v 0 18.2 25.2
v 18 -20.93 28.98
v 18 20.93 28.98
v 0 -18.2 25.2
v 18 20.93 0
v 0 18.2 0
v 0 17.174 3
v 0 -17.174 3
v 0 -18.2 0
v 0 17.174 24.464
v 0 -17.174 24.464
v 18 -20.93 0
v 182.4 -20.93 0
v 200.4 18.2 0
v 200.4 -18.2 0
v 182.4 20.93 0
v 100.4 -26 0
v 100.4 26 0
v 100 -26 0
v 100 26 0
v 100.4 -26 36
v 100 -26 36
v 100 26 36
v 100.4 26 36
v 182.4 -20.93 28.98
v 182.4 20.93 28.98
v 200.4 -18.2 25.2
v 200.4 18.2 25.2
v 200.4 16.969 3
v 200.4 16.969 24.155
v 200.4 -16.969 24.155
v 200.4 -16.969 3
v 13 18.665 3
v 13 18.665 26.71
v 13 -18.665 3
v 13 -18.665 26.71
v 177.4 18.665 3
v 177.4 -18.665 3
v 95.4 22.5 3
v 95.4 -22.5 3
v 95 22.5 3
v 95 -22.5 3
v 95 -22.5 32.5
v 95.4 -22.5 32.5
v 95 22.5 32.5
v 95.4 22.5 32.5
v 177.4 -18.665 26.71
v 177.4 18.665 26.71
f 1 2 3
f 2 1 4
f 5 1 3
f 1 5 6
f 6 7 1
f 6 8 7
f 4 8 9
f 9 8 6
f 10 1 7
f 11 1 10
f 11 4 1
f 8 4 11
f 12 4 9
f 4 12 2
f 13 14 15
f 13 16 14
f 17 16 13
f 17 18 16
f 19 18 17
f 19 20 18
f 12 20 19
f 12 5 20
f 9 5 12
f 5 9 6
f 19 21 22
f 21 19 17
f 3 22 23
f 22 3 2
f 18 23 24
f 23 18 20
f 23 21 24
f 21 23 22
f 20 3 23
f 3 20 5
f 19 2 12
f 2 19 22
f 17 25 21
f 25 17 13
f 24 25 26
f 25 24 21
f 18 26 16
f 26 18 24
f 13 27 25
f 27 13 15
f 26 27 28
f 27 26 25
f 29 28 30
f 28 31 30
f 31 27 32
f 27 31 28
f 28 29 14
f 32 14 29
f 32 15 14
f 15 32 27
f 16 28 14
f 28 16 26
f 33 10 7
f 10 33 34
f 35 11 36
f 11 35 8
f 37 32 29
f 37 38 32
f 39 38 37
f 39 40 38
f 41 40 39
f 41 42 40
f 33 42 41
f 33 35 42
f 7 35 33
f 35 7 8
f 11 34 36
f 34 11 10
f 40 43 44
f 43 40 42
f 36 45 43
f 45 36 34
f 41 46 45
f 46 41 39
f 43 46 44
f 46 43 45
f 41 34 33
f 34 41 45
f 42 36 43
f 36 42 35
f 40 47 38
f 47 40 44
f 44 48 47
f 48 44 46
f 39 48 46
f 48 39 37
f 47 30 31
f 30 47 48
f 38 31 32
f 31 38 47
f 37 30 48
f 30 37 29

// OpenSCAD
$fn = 32;

// ----------------------------------------------------------------------
// Faired channel: 200 x 52 x 36 mm, 3.5 mm walls, faired ends
// ----------------------------------------------------------------------

// --- parameters (mm) ---
length = 200;             // channel length
width = 52;               // channel width at mid length
height = 36;              // channel height at mid length
wall = 3.5;               // side wall thickness
floor_t = 3;              // floor thickness
end_w = 36.4;             // faired end width
end_h = 25.2;             // faired end height

difference() {
  union() {
    hull() {
      translate([0, -18.2, 0]) cube([0.4, 36.4, 25.2]);
      translate([18, -20.93, 0]) cube([0.4, 41.86, 28.98]);
    }
    hull() {
      translate([18, -20.93, 0]) cube([0.4, 41.86, 28.98]);
      translate([100, -26, 0]) cube([0.4, 52, 36]);
    }
    hull() {
      translate([100, -26, 0]) cube([0.4, 52, 36]);
      translate([182, -20.93, 0]) cube([0.4, 41.86, 28.98]);
    }
    hull() {
      translate([182, -20.93, 0]) cube([0.4, 41.86, 28.98]);
      translate([200, -18.2, 0]) cube([0.4, 36.4, 25.2]);
    }
  }
  /* cavity, 5 mm proud of both ends so the ports are cut clean */
  hull() {
    translate([-5, -16.6, 3]) cube([0.4, 33.2, 20.6]);
    translate([13, -18.665, 3]) cube([0.4, 37.33, 23.71]);
  }
  hull() {
    translate([13, -18.665, 3]) cube([0.4, 37.33, 23.71]);
    translate([95, -22.5, 3]) cube([0.4, 45, 29.5]);
  }
  hull() {
    translate([95, -22.5, 3]) cube([0.4, 45, 29.5]);
    translate([177, -18.665, 3]) cube([0.4, 37.33, 23.71]);
  }
  hull() {
    translate([177, -18.665, 3]) cube([0.4, 37.33, 23.71]);
    translate([205, -16.6, 3]) cube([0.4, 33.2, 20.6]);
  }
}
